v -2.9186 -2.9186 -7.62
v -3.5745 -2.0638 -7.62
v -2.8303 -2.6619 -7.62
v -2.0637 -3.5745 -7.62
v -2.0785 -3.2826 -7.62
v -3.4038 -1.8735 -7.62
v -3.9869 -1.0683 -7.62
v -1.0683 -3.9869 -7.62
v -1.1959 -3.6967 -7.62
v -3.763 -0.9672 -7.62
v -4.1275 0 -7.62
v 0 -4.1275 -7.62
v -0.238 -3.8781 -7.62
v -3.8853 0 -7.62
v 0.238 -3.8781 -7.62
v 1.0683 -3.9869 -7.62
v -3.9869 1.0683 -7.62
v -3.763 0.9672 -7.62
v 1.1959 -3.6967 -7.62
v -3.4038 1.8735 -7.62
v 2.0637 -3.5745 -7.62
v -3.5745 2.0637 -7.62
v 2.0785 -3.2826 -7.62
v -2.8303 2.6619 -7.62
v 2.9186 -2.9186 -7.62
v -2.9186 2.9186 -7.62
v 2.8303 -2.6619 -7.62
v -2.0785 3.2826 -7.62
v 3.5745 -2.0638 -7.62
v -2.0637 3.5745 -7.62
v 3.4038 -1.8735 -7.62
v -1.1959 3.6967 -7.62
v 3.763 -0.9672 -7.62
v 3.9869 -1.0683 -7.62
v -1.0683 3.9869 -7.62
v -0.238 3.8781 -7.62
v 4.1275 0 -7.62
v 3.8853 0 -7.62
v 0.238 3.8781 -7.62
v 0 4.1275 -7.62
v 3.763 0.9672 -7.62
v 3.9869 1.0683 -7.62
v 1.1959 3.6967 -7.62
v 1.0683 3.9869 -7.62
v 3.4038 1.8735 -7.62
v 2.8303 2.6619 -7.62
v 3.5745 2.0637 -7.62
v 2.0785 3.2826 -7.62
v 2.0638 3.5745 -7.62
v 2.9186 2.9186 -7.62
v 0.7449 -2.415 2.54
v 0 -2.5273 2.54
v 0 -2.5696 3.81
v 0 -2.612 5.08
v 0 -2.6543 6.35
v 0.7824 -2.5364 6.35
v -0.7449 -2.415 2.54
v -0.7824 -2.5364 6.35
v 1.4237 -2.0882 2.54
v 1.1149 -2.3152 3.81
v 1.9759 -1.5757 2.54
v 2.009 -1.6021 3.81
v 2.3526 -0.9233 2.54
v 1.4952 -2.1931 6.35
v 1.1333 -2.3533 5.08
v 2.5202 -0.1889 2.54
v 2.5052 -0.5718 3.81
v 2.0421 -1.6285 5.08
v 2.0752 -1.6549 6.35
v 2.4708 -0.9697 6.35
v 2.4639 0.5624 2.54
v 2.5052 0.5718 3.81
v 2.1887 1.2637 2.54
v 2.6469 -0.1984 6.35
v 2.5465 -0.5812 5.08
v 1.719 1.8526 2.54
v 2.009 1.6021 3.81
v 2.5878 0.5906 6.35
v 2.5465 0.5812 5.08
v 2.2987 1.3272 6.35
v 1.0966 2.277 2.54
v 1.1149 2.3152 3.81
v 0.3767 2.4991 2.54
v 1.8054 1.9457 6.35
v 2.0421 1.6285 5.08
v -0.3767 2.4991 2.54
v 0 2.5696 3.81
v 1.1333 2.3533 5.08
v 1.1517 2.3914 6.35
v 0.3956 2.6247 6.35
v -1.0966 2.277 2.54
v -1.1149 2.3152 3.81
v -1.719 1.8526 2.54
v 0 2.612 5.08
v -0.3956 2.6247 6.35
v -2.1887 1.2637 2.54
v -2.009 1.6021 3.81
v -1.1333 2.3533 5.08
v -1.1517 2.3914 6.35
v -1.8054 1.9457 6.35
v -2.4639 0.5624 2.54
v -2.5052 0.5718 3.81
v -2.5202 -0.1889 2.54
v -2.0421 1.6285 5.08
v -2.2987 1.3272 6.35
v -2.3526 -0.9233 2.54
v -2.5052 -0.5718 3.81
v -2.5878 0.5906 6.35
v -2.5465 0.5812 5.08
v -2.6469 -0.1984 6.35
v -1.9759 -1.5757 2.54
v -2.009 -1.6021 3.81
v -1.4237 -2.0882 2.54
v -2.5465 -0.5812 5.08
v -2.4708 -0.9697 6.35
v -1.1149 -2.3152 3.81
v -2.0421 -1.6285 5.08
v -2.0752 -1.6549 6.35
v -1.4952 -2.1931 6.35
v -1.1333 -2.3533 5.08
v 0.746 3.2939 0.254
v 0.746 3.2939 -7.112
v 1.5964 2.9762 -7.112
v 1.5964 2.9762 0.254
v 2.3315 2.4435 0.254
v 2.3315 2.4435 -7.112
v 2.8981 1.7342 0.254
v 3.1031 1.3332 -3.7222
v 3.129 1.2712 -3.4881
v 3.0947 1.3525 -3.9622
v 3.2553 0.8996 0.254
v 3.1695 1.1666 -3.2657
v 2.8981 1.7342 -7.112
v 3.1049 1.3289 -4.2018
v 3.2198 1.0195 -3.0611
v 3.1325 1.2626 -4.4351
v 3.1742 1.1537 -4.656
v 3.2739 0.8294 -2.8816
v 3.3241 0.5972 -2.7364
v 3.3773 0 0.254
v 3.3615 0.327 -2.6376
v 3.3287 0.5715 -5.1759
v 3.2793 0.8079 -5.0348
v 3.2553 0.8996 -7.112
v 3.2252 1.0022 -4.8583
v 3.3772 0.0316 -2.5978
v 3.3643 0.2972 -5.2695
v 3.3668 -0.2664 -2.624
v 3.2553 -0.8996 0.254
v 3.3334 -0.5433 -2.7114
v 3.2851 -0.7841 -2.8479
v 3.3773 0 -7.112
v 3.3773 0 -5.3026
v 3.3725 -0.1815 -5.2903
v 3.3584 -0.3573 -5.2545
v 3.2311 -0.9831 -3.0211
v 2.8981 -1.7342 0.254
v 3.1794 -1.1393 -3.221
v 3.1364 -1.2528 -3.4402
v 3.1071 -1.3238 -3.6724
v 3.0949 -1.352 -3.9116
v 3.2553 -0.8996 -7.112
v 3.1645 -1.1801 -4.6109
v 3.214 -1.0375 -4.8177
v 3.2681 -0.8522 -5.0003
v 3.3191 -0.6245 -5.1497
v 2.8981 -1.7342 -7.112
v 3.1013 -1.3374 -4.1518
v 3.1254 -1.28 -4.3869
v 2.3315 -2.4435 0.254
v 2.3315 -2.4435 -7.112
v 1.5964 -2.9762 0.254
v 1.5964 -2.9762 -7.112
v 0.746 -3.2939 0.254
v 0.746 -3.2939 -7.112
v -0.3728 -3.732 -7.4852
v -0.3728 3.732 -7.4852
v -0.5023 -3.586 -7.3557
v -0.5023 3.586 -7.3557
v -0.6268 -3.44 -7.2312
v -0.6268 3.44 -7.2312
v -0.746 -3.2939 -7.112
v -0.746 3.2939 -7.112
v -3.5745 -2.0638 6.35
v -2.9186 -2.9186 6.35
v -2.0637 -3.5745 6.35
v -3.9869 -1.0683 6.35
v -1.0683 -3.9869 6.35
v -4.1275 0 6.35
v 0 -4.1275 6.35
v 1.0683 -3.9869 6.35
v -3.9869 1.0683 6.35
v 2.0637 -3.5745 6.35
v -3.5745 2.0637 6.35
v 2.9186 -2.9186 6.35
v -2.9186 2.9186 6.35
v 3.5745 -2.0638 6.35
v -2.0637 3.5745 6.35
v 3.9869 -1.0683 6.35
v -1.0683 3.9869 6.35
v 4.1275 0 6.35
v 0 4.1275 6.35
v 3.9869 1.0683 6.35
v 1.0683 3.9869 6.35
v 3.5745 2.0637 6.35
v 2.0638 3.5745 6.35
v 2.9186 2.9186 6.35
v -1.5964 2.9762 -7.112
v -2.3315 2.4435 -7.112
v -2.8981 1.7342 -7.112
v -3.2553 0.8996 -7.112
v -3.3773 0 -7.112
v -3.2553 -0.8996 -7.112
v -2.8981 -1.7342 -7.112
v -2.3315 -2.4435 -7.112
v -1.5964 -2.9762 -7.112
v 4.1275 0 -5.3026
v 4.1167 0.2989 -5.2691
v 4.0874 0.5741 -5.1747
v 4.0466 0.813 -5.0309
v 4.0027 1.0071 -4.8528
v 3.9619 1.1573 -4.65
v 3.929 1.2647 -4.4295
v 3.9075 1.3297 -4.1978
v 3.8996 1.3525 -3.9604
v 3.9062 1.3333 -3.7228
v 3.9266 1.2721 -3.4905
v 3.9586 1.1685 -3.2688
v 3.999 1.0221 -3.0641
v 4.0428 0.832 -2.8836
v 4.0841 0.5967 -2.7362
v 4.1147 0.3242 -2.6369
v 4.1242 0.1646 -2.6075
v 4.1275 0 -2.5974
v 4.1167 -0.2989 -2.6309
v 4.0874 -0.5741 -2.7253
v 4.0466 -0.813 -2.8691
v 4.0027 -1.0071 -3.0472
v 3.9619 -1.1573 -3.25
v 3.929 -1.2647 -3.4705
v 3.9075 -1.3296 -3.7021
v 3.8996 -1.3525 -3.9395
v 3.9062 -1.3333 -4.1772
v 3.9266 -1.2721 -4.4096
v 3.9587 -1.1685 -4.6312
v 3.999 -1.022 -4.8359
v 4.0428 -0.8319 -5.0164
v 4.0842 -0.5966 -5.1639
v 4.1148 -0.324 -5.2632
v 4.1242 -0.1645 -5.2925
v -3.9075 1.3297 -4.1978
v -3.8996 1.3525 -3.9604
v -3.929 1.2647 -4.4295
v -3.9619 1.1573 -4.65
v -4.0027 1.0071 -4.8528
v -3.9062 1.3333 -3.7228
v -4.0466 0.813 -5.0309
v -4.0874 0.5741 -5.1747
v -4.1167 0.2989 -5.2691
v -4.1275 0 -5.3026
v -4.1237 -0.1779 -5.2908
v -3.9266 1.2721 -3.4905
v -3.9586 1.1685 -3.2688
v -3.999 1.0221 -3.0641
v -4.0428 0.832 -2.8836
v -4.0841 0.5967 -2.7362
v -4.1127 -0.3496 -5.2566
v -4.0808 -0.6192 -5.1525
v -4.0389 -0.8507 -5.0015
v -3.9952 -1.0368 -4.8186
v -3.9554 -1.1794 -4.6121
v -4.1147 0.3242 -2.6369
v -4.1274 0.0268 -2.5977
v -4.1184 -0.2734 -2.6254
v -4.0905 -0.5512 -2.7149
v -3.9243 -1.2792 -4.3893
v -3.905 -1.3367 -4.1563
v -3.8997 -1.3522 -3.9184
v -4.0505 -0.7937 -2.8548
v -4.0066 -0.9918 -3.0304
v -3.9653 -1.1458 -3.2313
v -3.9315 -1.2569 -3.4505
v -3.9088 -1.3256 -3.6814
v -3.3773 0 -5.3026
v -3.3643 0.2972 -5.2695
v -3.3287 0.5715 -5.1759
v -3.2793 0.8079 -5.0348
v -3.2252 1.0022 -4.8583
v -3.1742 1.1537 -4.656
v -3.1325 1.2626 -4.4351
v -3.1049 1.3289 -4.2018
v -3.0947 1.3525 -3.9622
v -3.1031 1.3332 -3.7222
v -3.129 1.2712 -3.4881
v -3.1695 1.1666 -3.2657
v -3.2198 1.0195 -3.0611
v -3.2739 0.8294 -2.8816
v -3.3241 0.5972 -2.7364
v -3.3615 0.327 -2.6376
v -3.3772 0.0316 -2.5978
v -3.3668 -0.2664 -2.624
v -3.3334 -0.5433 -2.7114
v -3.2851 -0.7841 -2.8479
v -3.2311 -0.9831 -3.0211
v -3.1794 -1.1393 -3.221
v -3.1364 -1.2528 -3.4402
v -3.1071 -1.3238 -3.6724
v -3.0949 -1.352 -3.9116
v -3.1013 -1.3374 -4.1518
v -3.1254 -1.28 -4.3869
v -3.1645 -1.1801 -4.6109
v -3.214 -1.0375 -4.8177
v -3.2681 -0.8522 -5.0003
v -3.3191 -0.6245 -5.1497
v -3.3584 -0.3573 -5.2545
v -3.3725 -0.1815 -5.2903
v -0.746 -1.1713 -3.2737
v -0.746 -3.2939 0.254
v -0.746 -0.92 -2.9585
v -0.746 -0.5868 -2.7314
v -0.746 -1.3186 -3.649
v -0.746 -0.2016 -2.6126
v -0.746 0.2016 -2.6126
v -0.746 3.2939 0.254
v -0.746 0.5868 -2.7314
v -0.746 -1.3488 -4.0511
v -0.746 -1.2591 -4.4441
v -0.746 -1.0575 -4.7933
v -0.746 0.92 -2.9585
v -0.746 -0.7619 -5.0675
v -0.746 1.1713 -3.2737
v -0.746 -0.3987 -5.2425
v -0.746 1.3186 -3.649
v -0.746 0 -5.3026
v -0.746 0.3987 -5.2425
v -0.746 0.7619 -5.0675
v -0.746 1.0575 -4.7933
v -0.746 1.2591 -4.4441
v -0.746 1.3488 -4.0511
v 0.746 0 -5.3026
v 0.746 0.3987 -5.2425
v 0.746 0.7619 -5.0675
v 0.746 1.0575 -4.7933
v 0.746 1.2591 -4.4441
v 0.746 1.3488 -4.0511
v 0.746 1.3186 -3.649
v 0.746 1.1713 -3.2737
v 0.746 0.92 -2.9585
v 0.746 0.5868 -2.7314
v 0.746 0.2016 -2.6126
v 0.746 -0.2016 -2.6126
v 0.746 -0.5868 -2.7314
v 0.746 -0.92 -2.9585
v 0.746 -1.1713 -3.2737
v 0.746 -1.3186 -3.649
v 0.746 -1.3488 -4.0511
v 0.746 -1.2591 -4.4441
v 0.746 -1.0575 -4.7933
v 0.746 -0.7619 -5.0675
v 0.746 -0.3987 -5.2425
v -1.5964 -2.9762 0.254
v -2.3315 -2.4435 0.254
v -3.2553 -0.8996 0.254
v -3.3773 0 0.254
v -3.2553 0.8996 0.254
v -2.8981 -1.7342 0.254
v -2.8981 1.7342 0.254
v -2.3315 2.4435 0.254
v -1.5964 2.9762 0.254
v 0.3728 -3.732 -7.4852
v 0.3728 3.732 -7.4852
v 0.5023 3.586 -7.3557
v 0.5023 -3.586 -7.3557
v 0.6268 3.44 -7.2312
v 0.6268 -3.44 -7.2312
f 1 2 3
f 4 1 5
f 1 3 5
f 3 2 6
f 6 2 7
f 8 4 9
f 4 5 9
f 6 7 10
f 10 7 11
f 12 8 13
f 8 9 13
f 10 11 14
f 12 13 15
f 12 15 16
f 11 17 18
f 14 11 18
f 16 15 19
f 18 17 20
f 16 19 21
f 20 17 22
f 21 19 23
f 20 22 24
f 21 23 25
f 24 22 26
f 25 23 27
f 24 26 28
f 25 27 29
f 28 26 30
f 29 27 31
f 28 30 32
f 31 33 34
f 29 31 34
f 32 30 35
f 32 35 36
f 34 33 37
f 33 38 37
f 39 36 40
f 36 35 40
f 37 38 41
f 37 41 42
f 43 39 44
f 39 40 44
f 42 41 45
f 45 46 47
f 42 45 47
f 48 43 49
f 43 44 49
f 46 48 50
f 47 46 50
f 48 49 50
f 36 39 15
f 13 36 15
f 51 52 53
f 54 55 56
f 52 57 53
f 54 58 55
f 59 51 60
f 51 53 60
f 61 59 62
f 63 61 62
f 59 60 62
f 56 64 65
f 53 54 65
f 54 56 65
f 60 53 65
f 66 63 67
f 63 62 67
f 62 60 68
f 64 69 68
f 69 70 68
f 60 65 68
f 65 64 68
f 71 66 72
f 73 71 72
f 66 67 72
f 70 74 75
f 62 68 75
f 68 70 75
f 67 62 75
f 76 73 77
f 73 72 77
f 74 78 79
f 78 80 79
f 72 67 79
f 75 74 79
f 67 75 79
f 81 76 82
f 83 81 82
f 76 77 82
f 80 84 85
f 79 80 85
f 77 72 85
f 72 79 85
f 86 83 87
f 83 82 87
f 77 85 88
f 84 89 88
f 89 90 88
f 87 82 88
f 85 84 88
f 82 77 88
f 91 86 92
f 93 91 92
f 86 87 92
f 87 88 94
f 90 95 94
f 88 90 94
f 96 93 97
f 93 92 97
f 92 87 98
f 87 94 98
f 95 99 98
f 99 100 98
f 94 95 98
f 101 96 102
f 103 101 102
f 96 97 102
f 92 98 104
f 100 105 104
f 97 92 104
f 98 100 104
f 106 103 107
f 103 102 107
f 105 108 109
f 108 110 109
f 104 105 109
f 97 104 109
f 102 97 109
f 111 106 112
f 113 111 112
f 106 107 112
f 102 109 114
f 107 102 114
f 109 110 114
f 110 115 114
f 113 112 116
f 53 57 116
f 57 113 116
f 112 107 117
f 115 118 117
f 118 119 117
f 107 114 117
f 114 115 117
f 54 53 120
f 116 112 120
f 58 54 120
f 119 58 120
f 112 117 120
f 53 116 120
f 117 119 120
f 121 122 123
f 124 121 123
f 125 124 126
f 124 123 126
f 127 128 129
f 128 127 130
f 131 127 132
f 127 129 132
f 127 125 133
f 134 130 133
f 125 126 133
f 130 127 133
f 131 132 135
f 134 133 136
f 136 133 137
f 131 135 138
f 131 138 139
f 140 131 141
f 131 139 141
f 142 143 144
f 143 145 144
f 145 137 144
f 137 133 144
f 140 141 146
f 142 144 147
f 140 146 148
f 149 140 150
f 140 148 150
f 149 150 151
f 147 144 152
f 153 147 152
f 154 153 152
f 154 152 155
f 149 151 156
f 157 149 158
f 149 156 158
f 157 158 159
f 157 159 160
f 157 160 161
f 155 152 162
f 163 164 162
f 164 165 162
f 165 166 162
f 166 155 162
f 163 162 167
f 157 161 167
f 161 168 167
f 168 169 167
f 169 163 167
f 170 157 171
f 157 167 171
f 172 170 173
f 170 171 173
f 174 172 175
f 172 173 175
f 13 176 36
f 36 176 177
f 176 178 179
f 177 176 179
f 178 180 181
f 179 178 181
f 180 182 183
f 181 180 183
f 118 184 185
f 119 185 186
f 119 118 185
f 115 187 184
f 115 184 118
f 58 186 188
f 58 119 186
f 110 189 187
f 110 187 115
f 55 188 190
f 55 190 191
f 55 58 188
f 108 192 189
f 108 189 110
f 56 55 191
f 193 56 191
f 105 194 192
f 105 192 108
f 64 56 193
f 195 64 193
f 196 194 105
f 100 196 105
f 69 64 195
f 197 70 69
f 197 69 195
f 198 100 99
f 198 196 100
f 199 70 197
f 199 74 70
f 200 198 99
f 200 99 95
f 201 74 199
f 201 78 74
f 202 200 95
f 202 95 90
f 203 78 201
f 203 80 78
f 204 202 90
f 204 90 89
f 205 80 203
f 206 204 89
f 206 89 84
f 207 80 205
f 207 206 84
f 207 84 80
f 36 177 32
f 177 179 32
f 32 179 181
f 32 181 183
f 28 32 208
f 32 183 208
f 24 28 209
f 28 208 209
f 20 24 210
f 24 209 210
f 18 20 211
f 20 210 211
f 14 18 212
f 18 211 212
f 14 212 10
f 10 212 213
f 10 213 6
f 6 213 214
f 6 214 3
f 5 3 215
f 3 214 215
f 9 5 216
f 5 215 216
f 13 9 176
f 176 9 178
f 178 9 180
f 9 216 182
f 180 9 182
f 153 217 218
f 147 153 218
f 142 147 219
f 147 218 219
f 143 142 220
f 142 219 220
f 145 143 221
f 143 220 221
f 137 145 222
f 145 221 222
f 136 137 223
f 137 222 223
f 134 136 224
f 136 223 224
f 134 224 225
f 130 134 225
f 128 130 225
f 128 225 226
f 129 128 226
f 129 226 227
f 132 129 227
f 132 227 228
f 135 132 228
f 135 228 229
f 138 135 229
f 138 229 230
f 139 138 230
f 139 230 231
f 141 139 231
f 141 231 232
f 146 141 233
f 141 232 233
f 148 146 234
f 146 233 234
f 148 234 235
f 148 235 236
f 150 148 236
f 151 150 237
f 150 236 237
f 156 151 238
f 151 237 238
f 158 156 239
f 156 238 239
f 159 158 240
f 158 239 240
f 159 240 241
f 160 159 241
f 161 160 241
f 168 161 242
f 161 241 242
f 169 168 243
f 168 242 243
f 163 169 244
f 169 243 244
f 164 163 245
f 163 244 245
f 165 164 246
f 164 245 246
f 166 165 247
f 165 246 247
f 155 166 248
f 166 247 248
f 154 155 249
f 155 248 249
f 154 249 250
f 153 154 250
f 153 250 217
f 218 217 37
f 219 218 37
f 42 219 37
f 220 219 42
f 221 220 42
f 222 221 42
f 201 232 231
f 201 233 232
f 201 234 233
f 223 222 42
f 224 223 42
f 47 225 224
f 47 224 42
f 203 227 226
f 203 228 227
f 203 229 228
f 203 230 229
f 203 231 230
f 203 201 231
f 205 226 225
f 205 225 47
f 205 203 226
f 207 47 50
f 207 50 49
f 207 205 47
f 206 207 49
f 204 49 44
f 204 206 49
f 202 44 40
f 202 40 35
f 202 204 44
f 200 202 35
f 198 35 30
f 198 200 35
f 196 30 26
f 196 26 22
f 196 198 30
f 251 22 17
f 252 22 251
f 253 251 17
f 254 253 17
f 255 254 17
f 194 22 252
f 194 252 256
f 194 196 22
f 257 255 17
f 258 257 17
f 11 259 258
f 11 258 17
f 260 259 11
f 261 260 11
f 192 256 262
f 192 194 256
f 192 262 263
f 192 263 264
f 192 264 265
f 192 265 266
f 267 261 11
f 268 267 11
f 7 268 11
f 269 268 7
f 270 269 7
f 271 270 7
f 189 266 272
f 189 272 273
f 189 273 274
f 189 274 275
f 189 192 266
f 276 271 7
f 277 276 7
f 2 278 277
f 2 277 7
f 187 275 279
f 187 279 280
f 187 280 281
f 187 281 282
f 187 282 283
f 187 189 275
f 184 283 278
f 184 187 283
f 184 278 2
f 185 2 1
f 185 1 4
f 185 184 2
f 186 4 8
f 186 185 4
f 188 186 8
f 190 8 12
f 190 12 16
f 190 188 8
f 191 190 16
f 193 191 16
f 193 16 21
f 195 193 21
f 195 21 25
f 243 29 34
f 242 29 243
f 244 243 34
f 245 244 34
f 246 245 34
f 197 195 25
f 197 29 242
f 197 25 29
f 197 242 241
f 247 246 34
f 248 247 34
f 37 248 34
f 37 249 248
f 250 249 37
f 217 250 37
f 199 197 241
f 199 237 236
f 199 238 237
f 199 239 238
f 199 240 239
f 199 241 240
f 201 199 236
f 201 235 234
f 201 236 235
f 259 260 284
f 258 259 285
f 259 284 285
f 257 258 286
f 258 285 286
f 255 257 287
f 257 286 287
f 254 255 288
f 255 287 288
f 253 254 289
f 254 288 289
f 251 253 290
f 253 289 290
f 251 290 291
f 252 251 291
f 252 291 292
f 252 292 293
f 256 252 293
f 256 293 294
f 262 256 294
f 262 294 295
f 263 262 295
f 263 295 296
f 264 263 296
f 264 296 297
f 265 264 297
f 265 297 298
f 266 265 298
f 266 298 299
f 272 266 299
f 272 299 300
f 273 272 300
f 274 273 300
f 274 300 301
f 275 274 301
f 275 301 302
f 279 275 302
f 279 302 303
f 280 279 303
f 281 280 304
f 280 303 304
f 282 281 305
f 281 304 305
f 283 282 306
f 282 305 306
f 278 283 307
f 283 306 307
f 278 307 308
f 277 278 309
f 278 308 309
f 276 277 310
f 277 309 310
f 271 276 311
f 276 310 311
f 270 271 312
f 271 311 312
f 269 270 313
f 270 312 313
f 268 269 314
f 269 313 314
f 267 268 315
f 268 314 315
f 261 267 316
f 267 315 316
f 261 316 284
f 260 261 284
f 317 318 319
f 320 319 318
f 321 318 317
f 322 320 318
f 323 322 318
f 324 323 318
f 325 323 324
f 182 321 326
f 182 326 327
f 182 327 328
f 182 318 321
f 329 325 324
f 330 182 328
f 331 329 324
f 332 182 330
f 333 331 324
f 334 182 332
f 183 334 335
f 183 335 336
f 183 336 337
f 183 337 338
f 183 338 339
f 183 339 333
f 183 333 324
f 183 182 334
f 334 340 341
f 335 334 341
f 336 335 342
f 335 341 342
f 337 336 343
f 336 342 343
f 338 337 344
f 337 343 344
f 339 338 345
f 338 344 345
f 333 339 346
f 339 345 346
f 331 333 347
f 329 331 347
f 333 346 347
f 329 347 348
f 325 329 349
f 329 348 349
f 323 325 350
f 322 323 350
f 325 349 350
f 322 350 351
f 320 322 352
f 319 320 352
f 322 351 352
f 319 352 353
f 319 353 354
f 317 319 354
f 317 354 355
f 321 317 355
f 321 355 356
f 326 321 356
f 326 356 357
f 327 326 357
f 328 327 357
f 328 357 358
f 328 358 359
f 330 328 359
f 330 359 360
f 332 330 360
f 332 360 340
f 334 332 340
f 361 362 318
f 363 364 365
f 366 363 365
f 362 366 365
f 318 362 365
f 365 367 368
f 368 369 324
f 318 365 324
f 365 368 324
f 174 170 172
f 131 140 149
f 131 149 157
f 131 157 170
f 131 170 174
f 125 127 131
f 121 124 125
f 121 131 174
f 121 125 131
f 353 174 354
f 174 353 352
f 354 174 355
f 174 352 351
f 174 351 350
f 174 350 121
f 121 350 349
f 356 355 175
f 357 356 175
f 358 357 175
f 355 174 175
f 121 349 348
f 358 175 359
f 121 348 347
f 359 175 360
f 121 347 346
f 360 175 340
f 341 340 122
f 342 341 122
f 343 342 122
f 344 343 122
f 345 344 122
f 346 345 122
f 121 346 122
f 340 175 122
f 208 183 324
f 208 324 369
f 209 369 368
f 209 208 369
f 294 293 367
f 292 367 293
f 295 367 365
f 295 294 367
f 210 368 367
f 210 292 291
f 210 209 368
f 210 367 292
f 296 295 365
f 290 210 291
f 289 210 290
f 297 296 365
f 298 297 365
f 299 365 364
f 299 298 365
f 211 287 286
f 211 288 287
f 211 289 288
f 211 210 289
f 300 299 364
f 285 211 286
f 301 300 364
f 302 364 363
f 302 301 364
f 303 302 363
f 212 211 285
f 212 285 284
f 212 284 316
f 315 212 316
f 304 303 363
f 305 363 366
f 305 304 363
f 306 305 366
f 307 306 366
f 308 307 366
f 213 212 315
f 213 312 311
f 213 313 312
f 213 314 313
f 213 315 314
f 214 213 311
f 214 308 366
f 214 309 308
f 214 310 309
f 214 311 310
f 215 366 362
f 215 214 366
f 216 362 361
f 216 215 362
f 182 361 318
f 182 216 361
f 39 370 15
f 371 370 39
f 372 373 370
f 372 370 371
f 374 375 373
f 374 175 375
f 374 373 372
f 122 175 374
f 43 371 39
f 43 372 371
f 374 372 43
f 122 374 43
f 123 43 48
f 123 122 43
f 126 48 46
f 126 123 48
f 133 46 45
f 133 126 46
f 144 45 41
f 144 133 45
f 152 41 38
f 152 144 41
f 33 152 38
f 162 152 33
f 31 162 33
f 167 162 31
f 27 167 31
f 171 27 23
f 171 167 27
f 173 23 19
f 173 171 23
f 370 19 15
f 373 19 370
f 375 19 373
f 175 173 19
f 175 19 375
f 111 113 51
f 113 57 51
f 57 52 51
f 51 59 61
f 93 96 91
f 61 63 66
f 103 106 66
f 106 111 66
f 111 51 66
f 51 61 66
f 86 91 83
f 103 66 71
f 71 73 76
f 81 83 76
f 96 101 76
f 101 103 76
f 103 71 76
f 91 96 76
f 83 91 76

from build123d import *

# Parameters (mm, degrees)
SKETCH1_R                = 4.1275
BOSS_EXTRUDE1_DEPTH      = 6.35
BOSS_EXTRUDE1_DEPTH_BACK = 7.62
CUT_EXTRUDE1_DEPTH       = 7.874
F_2_CLEARANCE_HOLE1_D    = 2.7051
CHAMFER1_SIZE            = 0.508


with BuildPart() as part:
    # Sketch1 → Boss-Extrude1 (new body, two sides)
    with BuildSketch(Plane.XY) as boss_extrude1_sk:
        Circle(SKETCH1_R)
    extrude(amount=BOSS_EXTRUDE1_DEPTH)
    extrude(boss_extrude1_sk.sketch, amount=-BOSS_EXTRUDE1_DEPTH_BACK)

    # Sketch2 → Cut-Extrude1 (cut)
    with BuildSketch(Plane(origin=(0, 0, -7.62), x_dir=(-1, 0, 0), z_dir=(0, 0, -1))):
        with BuildLine():
            Line((-0.746, -3.293929837), (-0.746, 3.293929837))
            ThreePointArc((-0.746, 3.293929837), (-3.377349518, 0), (-0.746, -3.293929837))
        make_face()
        with BuildLine():
            Line((0.746, -3.293929837), (0.746, 3.293929837))
            ThreePointArc((0.746, 3.293929837), (3.377349518, 0), (0.746, -3.293929837))
        make_face()
    extrude(amount=-CUT_EXTRUDE1_DEPTH, mode=Mode.SUBTRACT)

    # #2 Clearance Hole1 (through all)
    with Locations(Plane.ZY.offset(4.1275)):
        with Locations((-3.95, 0)):
            Hole(F_2_CLEARANCE_HOLE1_D / 2)

    # Sketch5 → Hole1 (revolve, cut)
    with BuildSketch(Plane(origin=(0, 0, 6.35), x_dir=(0, -1, 0), z_dir=(1, 0, 0))):
        Polygon((0, 0), (0, 3.81), (2.5273, 3.81), (2.6543, 0), align=None)
    revolve(axis=Axis((0, 0, -103.65), (0, 0, 1)), mode=Mode.SUBTRACT)

    # Chamfer1
    chamfer1_edges = [part.edges().sort_by_distance(p)[0] for p in [
        (3.377349518, 0, -7.62),
        (0.746, 0, -7.62),
        (-3.377349518, 0, -7.62),
        (-0.746, 0, -7.62),
    ]]
    chamfer(chamfer1_edges, length=CHAMFER1_SIZE)


solid = part.part
